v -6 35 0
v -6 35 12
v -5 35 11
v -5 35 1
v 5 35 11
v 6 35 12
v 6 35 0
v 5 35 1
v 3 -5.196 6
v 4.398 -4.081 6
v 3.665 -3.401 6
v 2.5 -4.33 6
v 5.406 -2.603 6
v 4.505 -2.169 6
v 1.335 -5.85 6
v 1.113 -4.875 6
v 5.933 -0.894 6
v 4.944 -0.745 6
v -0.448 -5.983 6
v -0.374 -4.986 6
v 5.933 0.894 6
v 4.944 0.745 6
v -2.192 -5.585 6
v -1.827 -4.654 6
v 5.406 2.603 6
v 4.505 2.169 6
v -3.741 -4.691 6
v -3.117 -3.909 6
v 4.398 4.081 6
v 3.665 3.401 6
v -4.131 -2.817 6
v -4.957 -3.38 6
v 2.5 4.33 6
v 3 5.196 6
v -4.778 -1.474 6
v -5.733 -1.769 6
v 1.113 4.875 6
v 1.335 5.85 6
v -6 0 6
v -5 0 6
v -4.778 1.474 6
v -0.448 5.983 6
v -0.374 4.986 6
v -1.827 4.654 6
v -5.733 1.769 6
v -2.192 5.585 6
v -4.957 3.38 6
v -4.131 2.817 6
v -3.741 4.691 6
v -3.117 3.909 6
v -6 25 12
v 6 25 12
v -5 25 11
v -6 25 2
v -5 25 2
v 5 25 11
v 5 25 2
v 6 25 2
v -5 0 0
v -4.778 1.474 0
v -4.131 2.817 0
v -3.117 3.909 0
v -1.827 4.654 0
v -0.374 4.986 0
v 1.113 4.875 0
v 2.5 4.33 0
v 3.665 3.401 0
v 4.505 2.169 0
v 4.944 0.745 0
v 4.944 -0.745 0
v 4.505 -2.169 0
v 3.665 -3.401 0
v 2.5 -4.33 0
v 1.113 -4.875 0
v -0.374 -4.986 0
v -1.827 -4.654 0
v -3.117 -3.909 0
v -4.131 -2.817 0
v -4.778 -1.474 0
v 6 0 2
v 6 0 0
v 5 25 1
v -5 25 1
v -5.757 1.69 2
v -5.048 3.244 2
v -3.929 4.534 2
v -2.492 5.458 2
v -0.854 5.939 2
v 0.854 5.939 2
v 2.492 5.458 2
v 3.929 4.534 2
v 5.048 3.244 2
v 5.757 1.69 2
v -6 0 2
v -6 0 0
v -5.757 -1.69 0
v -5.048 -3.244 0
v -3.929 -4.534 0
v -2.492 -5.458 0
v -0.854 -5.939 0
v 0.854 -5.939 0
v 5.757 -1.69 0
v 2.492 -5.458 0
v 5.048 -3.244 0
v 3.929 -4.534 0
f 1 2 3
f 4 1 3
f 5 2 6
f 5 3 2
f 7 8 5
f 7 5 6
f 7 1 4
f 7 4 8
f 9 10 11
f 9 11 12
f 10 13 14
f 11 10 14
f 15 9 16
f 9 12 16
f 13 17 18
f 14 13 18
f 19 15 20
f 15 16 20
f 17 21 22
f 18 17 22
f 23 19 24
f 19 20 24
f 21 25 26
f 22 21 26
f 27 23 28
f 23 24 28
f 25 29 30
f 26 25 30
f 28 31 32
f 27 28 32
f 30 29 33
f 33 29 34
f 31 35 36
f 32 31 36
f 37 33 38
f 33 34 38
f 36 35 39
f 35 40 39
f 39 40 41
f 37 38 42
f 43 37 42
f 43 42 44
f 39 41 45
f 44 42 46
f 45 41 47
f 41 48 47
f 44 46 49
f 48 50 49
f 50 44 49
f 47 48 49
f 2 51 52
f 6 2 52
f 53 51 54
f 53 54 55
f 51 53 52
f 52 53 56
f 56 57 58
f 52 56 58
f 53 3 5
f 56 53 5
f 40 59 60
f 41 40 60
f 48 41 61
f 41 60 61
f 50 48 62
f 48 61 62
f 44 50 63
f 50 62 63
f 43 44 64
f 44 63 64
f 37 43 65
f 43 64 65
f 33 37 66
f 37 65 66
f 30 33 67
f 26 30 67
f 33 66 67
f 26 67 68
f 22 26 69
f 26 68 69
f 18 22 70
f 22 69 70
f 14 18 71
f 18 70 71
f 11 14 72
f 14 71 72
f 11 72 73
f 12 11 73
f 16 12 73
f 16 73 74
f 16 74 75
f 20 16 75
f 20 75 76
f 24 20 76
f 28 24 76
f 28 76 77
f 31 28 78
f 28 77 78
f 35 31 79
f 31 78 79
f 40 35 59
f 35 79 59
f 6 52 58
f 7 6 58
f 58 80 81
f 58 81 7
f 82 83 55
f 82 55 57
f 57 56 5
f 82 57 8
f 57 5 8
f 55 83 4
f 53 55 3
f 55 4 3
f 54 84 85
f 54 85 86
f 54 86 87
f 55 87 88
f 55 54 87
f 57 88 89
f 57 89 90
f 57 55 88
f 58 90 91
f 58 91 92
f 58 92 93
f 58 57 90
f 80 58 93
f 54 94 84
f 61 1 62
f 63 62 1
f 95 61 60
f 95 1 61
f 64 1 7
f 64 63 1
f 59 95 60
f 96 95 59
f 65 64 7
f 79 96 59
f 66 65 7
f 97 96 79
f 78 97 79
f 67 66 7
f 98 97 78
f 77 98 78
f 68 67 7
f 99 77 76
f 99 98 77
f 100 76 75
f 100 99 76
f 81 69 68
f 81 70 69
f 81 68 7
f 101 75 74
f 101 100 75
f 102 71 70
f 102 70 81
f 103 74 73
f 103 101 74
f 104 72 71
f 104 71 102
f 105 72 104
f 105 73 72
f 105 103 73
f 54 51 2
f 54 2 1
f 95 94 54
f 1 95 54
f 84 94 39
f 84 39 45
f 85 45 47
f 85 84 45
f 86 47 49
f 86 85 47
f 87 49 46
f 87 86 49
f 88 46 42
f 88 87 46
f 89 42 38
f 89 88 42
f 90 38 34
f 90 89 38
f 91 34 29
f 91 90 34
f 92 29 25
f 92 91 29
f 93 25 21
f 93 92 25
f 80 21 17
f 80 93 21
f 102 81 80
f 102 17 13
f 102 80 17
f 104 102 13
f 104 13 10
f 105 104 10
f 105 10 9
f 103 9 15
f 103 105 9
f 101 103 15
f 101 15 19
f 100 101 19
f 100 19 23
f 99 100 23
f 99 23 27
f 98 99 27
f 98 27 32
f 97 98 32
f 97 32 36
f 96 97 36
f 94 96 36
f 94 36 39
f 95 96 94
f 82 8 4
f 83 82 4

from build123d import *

# Parameters (mm, degrees)
EXTRUDE_1_DEPTH     = 2
SKETCH_4_R          = 6
SKETCH_4_R_2        = 5
EXTRUDE_2_DEPTH     = 6
SKETCH_5_W          = 12
SKETCH_5_H          = 12
EXTRUDE_3_DEPTH     = 10
CUT_EXTRUDE_1_DEPTH = 10


with BuildPart() as part:
    # 草图1 → 凸台-拉伸1 (new body)
    with BuildSketch(Plane.XY):
        with BuildLine():
            ThreePointArc((-6, 0), (0, 6), (6, 0))
            Line((6, 0), (6, 25))
            Line((6, 25), (-6, 25))
            Line((-6, 25), (-6, 0))
        make_face()
    extrude(amount=EXTRUDE_1_DEPTH)

    # 草图4 → 凸台-拉伸2 (add)
    with BuildSketch(Plane(origin=(0, 0, 0), x_dir=(-1, 0, 0), z_dir=(0, 0, -1))):
        Circle(SKETCH_4_R)
        Circle(SKETCH_4_R_2, mode=Mode.SUBTRACT)
    extrude(amount=-EXTRUDE_2_DEPTH)

    # 草图5 → 凸台-拉伸3 (add)
    with BuildSketch(Plane(origin=(0, 25, 0), x_dir=(1, 0, 0), z_dir=(0, 1, 0))):
        with Locations((0, -6)):
            Rectangle(SKETCH_5_W, SKETCH_5_H)
    extrude(amount=EXTRUDE_3_DEPTH)

    # 草图6 → 切除-拉伸1 (cut)
    with BuildSketch(Plane(origin=(0, 35, 0), x_dir=(1, 0, 0), z_dir=(0, 1, 0))):
        Polygon((5, -1), (-5, -1), (5, -11), align=None)
        Polygon((5, -11), (-5, -1), (-5, -11), align=None)
    extrude(amount=-CUT_EXTRUDE_1_DEPTH, mode=Mode.SUBTRACT)


solid = part.part
